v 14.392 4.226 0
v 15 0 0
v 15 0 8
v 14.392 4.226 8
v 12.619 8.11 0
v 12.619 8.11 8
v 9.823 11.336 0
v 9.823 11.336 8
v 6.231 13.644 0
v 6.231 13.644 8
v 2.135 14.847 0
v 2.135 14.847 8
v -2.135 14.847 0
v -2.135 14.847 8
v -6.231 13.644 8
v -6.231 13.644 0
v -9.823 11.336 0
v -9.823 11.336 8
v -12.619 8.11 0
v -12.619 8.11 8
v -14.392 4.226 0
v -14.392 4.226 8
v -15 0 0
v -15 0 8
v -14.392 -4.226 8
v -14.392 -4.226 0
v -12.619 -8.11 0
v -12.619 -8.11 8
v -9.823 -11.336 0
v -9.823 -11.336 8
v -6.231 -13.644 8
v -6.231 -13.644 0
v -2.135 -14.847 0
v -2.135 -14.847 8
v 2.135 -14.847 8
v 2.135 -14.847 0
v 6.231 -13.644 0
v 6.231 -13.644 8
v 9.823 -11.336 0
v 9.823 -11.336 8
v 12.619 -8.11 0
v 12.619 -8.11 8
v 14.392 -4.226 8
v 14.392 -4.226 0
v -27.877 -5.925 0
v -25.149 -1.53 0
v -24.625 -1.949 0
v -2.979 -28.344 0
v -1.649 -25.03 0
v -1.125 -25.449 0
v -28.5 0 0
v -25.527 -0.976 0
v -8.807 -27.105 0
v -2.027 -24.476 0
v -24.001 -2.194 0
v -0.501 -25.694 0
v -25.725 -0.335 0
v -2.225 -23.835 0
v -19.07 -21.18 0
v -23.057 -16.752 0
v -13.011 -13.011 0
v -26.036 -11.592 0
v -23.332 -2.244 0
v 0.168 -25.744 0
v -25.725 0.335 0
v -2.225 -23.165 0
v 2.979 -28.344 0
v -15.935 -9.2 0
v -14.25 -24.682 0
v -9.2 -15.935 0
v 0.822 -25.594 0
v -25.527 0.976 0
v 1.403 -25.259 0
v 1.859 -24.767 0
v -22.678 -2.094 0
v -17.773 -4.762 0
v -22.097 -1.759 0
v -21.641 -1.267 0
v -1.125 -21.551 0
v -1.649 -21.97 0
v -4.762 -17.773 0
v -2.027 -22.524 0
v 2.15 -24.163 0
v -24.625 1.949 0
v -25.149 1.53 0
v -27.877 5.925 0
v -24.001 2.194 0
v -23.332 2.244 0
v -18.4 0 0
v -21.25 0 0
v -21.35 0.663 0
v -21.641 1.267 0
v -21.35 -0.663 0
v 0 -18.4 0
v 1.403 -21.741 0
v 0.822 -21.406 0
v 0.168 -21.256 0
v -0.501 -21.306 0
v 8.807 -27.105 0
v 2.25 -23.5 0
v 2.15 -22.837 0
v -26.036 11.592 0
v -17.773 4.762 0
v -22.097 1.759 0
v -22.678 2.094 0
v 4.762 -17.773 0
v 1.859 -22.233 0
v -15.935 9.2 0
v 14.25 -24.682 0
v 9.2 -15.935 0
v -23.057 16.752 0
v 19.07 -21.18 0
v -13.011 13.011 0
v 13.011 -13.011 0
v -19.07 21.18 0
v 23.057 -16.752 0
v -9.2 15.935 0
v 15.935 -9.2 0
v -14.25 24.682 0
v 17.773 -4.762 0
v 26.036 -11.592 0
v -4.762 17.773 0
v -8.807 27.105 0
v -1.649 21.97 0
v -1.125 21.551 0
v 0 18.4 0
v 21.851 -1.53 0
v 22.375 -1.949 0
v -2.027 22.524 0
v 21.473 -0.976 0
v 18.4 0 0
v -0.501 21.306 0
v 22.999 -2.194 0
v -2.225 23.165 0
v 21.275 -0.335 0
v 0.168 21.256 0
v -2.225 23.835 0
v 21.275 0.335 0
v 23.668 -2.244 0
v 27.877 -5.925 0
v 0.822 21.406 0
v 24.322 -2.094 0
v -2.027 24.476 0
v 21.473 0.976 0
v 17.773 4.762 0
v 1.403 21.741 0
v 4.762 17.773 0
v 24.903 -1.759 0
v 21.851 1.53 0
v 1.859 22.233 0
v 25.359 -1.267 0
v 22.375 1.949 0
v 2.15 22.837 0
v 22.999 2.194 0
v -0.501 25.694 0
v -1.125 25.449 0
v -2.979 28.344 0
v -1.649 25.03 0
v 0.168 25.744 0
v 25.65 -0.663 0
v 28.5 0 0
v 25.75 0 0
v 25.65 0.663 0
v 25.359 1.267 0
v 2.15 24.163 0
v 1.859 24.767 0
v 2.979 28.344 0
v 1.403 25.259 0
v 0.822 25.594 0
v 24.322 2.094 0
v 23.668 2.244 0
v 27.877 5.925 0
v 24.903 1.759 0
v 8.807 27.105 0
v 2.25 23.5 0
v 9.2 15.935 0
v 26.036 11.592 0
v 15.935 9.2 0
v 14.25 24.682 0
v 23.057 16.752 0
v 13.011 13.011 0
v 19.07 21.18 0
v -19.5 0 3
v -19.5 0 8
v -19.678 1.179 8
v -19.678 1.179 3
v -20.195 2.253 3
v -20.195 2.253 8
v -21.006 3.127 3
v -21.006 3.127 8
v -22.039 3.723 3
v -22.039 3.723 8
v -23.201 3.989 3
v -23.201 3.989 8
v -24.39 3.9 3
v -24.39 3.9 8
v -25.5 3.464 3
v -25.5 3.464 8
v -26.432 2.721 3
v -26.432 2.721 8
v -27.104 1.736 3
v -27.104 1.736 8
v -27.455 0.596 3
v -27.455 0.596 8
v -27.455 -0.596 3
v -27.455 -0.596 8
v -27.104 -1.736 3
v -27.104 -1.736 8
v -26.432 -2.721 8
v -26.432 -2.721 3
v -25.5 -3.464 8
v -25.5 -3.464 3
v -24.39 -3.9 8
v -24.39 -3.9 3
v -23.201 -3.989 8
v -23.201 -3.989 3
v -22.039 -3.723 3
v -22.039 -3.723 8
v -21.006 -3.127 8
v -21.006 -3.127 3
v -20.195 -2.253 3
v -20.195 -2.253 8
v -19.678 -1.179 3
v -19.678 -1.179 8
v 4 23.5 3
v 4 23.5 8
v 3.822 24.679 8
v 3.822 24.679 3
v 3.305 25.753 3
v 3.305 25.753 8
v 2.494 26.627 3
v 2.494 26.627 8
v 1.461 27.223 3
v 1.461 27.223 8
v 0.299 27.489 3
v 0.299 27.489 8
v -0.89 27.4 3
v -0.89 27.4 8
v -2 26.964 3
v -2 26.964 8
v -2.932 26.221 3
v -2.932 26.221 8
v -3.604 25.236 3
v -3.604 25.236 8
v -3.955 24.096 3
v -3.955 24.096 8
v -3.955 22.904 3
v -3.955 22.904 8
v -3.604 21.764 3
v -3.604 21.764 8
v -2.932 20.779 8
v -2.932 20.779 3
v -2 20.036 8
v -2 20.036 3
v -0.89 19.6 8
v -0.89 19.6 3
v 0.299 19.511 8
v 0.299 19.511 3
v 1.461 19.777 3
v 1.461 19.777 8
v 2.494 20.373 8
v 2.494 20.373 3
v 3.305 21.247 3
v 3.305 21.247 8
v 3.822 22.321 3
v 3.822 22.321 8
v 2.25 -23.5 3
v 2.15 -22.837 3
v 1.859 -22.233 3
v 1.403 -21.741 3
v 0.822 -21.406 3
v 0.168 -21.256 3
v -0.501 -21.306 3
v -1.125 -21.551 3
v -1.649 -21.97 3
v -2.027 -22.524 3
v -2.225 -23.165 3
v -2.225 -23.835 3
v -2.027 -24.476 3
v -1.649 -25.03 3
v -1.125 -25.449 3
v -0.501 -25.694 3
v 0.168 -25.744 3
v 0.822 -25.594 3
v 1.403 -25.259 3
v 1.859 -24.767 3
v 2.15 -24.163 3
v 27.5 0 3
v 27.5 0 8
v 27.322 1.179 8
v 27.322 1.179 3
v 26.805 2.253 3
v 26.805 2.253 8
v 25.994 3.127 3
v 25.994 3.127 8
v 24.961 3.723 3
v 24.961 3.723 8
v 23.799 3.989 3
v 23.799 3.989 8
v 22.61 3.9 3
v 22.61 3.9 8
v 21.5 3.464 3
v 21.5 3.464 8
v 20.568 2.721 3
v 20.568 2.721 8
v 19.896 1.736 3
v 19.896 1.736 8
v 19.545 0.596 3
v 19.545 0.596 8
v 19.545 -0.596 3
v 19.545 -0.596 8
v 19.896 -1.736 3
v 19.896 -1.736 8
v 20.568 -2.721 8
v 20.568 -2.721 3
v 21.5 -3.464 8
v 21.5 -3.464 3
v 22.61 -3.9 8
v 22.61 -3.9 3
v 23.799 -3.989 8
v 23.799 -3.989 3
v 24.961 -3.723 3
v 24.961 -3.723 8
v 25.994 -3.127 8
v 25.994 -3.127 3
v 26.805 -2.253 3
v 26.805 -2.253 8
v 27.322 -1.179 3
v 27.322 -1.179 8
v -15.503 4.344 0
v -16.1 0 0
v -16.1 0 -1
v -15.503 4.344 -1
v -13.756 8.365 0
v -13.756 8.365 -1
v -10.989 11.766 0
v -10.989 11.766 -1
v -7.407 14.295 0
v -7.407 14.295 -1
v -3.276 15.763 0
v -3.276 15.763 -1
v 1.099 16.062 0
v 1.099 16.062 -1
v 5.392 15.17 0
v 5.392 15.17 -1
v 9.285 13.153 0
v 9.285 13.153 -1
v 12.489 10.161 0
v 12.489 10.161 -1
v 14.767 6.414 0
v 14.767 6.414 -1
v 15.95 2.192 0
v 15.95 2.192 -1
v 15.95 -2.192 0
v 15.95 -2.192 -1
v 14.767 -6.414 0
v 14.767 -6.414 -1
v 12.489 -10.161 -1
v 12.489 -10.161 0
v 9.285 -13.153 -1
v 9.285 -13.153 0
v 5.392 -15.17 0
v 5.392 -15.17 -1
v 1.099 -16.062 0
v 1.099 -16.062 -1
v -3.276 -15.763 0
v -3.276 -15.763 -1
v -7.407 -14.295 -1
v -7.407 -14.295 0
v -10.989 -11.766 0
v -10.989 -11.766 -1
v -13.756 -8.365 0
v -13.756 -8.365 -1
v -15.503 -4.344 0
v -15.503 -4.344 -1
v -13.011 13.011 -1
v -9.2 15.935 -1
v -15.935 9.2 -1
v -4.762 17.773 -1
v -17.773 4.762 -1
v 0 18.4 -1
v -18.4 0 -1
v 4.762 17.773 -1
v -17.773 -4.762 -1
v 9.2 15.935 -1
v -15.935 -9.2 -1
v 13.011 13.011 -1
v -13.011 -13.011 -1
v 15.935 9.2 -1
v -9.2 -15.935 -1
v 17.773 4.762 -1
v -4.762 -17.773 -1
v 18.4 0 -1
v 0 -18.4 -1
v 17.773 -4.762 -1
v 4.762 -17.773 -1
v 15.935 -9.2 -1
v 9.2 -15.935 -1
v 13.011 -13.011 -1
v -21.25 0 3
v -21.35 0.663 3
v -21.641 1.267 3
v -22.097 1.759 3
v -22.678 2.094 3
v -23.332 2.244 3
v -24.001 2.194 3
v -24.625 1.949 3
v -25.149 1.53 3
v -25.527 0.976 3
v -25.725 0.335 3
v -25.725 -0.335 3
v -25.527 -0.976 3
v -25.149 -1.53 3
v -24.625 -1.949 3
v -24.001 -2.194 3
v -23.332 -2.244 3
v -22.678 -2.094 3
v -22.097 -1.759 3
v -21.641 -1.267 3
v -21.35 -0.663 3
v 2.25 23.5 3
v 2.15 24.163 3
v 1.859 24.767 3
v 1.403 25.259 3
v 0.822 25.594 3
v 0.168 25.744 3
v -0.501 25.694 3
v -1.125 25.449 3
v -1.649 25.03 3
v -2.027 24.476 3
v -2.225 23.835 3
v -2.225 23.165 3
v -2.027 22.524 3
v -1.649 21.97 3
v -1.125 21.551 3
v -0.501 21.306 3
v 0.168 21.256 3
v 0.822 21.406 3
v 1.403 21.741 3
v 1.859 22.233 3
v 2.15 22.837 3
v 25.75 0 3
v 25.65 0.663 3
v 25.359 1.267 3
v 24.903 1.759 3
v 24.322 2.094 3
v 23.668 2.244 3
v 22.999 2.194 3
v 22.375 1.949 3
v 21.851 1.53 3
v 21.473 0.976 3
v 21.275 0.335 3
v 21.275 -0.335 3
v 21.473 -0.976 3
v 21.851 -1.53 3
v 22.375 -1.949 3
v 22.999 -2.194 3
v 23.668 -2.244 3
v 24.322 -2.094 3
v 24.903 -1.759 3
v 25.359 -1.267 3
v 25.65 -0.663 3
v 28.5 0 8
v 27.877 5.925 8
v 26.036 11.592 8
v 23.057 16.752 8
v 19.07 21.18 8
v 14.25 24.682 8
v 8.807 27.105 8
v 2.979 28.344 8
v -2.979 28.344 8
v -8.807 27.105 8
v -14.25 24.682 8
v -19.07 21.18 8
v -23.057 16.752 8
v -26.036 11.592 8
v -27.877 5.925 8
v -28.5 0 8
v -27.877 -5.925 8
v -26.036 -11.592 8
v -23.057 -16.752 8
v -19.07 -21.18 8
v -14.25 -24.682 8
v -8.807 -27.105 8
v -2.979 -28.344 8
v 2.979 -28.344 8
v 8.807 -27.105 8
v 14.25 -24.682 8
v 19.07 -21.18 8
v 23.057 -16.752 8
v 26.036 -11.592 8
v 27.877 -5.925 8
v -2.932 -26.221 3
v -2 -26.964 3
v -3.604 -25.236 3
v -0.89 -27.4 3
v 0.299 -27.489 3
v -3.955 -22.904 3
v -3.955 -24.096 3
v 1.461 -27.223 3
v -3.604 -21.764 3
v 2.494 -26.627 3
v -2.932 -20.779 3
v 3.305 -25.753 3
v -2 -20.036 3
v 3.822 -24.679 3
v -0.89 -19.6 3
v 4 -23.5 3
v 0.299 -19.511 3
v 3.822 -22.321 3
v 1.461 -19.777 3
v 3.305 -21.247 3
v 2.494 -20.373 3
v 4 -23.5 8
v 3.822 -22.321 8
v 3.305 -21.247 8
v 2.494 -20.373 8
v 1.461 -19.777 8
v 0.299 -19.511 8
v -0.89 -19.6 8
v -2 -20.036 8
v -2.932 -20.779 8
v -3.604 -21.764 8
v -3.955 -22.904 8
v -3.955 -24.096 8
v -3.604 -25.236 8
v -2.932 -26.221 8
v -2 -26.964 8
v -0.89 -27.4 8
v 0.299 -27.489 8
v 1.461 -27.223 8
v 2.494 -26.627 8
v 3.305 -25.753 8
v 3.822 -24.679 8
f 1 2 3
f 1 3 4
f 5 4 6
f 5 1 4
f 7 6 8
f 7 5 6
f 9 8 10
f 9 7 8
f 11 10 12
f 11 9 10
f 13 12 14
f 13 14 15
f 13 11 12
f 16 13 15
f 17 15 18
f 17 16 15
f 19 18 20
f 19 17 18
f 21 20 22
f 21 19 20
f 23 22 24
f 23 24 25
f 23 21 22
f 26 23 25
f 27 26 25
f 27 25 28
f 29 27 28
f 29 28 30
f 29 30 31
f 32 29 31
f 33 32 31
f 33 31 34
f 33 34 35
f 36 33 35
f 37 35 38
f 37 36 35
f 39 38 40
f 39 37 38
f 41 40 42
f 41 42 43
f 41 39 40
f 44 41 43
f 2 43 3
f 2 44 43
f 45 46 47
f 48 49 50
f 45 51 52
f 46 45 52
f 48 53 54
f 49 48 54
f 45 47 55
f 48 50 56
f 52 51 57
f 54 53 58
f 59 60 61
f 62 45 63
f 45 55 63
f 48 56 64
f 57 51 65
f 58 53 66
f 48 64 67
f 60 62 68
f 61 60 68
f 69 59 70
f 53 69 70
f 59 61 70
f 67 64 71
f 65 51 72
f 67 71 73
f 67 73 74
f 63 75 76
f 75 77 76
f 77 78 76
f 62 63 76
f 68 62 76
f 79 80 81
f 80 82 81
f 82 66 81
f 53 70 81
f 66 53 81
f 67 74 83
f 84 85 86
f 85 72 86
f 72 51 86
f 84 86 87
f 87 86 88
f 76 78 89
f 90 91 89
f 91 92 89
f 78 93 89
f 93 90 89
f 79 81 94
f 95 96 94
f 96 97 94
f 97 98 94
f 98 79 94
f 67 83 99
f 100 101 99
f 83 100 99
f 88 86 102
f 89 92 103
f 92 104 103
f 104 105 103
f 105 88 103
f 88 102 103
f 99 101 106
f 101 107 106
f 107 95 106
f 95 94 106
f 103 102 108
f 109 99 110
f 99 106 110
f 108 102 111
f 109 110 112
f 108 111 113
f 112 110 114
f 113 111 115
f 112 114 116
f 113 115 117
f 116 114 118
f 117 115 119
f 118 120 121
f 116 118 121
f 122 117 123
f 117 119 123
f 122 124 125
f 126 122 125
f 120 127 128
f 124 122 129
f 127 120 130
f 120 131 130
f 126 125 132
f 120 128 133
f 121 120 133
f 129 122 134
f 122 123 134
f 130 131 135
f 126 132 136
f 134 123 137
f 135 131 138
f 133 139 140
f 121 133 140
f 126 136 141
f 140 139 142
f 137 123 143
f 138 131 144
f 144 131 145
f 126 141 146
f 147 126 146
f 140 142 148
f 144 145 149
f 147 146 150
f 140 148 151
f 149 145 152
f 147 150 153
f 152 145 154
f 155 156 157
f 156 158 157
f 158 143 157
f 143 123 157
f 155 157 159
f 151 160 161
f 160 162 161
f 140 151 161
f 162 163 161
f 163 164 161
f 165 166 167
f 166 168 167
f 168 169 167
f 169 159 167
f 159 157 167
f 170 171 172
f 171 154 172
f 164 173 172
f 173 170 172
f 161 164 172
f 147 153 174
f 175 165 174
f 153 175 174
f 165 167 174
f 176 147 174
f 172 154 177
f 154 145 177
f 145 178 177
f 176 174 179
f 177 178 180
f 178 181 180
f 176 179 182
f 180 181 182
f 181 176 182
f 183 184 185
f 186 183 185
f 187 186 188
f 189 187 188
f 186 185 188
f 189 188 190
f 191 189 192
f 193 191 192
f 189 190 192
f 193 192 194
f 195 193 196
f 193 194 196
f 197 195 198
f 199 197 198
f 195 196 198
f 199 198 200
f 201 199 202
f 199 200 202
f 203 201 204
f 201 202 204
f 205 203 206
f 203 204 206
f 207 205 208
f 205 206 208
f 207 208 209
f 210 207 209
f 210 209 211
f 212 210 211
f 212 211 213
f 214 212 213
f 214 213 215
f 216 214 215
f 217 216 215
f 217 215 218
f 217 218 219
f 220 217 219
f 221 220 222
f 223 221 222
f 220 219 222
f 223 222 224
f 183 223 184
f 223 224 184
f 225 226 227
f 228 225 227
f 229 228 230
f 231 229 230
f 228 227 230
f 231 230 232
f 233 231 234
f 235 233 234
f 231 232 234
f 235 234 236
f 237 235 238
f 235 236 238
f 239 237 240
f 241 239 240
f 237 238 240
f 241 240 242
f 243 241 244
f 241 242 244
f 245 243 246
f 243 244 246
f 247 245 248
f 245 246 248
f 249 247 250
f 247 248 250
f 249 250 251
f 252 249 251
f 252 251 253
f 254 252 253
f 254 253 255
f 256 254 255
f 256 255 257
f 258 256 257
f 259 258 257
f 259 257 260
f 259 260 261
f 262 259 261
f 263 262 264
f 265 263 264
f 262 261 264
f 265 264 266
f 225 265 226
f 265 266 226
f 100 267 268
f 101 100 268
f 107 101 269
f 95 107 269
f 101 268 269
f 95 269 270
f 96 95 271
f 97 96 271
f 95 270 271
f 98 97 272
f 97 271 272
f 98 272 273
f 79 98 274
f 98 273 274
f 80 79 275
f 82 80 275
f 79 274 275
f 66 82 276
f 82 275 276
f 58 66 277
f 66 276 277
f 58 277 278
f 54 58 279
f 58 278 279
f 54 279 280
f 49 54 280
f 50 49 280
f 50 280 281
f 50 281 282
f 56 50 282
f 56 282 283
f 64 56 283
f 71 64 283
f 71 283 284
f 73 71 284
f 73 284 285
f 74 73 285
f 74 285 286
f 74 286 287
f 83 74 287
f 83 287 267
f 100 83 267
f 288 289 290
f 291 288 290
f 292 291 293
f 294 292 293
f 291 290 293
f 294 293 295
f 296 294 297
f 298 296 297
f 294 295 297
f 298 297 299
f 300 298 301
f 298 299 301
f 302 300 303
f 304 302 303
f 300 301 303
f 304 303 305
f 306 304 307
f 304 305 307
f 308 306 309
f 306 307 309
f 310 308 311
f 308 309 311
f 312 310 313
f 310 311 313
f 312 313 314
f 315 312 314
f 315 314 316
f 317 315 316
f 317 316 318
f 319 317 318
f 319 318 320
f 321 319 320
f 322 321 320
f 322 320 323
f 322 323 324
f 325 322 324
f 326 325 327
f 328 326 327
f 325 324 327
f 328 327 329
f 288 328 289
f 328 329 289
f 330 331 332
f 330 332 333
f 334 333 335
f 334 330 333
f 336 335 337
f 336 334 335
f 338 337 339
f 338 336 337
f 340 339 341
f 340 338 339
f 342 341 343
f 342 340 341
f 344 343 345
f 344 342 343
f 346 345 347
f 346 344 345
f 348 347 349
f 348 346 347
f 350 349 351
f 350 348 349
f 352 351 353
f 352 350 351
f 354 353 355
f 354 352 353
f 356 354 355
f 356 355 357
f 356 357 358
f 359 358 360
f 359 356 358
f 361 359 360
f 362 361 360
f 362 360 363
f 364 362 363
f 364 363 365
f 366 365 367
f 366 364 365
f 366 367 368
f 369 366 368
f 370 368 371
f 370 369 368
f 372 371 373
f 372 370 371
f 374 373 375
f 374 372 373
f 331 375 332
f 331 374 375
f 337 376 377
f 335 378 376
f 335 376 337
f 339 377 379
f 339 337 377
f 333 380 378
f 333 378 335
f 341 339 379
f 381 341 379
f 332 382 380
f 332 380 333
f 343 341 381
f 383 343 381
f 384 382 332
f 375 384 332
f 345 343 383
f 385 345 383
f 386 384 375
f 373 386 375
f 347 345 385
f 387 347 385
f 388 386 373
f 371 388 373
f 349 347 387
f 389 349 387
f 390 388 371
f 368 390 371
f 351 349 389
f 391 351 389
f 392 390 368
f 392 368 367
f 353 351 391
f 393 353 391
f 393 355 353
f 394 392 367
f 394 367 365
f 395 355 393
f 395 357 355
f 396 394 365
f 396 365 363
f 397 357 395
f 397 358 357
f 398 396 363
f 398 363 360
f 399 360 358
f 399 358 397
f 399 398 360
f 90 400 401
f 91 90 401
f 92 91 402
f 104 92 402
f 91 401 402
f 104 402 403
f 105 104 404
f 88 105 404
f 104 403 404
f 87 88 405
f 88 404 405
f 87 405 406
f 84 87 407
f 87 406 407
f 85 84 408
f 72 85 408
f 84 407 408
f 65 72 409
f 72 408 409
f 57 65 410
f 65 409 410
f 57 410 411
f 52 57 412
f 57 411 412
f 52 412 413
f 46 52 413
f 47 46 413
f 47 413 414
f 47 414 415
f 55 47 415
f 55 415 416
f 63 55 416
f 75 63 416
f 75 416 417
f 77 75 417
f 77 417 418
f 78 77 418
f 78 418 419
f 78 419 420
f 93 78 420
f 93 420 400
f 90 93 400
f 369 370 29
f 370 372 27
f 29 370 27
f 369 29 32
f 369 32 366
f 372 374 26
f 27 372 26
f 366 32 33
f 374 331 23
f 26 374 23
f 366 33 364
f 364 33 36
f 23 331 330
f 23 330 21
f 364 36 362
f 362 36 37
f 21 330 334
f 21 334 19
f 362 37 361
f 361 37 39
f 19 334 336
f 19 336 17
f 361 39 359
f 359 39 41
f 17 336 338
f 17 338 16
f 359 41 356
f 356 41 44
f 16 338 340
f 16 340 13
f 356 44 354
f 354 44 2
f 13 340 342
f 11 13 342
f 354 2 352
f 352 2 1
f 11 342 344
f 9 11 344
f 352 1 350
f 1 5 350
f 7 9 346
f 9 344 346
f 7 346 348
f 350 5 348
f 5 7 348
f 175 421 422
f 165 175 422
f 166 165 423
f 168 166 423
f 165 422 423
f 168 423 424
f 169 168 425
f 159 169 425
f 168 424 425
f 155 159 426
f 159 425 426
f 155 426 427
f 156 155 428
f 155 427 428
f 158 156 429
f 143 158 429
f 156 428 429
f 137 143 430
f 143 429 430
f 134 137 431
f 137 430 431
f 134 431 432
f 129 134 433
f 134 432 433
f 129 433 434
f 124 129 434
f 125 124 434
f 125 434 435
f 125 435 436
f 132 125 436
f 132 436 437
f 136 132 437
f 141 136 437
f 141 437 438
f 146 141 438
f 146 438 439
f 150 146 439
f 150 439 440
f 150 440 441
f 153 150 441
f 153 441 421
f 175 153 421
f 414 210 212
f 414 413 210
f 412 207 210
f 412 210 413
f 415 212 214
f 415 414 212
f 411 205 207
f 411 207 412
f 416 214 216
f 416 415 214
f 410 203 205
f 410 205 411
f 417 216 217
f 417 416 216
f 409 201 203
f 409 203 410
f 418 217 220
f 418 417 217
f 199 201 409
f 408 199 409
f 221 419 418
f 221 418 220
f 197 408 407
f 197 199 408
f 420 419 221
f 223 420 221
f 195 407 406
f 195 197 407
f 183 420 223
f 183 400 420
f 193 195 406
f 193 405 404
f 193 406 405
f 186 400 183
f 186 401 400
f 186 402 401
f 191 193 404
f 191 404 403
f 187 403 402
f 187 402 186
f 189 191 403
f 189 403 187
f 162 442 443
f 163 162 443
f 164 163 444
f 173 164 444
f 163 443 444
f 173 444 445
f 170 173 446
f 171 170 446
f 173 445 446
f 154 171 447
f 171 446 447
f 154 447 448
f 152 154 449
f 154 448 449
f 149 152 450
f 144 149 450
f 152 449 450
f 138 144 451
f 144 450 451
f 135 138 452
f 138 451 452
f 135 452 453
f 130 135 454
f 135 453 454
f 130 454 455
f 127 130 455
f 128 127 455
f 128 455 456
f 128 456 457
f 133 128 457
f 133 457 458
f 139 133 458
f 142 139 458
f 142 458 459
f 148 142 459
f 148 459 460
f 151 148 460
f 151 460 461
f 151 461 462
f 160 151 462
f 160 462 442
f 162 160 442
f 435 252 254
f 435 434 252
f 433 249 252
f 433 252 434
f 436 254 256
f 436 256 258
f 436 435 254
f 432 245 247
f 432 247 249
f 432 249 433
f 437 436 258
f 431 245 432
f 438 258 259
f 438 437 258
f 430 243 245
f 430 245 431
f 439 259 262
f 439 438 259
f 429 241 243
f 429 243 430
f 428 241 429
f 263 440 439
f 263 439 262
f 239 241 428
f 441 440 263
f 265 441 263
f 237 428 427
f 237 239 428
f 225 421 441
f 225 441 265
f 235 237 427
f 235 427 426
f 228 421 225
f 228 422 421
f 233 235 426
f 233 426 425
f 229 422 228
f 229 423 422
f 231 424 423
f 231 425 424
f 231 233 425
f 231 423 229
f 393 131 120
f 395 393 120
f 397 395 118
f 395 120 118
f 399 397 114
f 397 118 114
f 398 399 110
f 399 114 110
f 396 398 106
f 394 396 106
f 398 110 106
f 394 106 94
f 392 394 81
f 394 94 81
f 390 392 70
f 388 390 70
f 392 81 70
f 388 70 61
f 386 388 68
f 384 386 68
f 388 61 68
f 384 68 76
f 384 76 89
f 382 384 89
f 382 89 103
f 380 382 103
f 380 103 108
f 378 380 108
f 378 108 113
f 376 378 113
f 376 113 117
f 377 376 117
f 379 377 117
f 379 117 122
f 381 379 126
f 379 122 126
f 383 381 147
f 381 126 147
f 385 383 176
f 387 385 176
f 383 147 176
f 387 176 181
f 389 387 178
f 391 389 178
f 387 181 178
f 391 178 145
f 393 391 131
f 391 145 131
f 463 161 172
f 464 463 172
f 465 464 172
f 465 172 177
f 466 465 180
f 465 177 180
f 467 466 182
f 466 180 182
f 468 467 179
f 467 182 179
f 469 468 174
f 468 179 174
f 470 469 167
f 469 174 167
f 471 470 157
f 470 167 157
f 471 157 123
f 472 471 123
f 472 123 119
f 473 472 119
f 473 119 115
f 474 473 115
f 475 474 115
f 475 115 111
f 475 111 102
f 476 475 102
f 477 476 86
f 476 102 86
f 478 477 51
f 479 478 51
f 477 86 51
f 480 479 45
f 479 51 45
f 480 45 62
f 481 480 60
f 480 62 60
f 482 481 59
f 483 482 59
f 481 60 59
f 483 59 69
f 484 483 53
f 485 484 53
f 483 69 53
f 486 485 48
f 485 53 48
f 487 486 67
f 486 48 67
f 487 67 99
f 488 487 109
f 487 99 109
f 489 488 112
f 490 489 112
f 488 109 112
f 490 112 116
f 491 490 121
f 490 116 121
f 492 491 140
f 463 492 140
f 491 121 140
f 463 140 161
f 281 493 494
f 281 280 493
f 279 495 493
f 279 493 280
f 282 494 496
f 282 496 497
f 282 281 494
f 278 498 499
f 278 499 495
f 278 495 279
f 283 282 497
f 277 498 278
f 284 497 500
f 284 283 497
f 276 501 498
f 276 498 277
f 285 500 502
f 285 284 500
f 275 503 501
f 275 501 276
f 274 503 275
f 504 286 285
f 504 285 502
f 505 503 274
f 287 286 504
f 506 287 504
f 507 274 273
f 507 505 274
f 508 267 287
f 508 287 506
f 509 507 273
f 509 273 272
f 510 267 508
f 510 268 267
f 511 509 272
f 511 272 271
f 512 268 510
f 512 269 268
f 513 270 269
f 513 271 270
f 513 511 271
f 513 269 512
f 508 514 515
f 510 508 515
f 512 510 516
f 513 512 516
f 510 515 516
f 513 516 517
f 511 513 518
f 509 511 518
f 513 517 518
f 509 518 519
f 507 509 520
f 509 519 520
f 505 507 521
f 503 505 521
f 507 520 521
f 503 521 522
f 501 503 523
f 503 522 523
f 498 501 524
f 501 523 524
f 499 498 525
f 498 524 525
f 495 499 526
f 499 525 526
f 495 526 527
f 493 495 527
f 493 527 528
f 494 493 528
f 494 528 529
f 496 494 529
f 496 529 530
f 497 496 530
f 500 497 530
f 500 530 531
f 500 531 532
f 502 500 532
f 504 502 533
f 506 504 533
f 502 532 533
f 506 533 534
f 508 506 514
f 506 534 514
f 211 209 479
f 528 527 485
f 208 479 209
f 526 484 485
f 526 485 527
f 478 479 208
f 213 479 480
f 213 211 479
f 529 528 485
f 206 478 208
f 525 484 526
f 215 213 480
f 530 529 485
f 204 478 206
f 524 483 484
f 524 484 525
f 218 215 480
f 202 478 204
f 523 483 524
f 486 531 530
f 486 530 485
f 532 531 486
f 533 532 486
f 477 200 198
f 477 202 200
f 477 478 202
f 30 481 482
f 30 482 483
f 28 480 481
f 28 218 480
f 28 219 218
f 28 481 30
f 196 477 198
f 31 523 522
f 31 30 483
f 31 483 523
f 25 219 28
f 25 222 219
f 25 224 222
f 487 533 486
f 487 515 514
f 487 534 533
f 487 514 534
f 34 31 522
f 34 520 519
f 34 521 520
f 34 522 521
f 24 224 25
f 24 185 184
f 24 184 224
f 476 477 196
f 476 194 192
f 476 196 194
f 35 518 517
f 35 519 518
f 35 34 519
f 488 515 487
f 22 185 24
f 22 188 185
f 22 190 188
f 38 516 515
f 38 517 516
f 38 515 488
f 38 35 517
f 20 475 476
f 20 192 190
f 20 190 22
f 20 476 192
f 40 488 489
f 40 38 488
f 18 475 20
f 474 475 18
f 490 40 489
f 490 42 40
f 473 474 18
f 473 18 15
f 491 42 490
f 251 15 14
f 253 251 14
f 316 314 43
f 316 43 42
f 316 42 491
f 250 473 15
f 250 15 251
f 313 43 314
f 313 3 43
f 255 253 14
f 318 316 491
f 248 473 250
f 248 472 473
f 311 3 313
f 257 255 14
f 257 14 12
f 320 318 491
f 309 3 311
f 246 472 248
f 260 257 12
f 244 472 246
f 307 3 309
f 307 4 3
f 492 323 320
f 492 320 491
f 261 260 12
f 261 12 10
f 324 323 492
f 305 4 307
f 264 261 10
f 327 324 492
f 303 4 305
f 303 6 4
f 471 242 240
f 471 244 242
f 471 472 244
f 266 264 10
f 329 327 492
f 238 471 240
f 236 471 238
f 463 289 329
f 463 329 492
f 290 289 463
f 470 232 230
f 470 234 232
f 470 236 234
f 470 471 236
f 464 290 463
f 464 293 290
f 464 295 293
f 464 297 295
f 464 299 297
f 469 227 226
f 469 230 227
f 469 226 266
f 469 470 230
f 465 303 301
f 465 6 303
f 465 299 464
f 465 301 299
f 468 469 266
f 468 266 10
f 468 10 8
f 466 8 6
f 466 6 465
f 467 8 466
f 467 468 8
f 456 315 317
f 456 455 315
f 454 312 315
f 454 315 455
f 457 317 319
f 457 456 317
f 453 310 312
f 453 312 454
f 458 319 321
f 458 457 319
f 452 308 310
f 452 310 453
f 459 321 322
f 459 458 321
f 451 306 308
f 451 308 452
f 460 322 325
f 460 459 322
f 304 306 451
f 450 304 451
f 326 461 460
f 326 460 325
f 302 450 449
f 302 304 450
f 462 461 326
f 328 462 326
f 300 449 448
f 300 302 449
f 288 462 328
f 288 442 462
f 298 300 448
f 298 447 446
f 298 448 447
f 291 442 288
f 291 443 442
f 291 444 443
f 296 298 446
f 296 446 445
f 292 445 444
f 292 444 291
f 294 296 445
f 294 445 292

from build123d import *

# Parameters (mm, degrees)
SKETCH_1_R          = 28.5
SKETCH_1_R_2        = 15
EXTRUDE_1_DEPTH     = 8
SKETCH_2_R          = 18.4
SKETCH_2_R_2        = 16.1
EXTRUDE_2_DEPTH     = 1
SKETCH_3_R          = 4
CUT_EXTRUDE_1_DEPTH = 5
SKETCH_4_R          = 2.25
CUT_EXTRUDE_2_DEPTH = 42.297699694


with BuildPart() as part:
    # 草图1 → 拉伸1 (new body)
    with BuildSketch(Plane.XY):
        Circle(SKETCH_1_R)
        Circle(SKETCH_1_R_2, mode=Mode.SUBTRACT)
    extrude(amount=EXTRUDE_1_DEPTH)

    # 草图2 → 拉伸2 (add)
    with BuildSketch(Plane(origin=(0, 0, 0), x_dir=(-1, 0, 0), z_dir=(0, 0, -1))):
        with Locations(Location((0, 0, 0), (0, 0, 180))):
            Circle(SKETCH_2_R)
        Circle(SKETCH_2_R_2, mode=Mode.SUBTRACT)
    extrude(amount=EXTRUDE_2_DEPTH)

    # 草图3 → 切除-拉伸1 (cut)
    with BuildSketch(Plane.XY.offset(8)):
        with Locations((0, 23.5)):
            Circle(SKETCH_3_R)
        with Locations((-23.5, 0)):
            Circle(SKETCH_3_R)
        with Locations((0, -23.5)):
            Circle(SKETCH_3_R)
        with Locations((23.5, 0)):
            Circle(SKETCH_3_R)
    extrude(amount=-CUT_EXTRUDE_1_DEPTH, mode=Mode.SUBTRACT)

    # 草图4 → 切除-拉伸2 (cut, through all)
    with BuildSketch(Plane.XY.offset(8)):
        with Locations((-23.5, 0)):
            Circle(SKETCH_4_R)
        with Locations((0, 23.5)):
            Circle(SKETCH_4_R)
        with Locations((23.5, 0)):
            Circle(SKETCH_4_R)
        with Locations((0, -23.5)):
            Circle(SKETCH_4_R)
    extrude(amount=-CUT_EXTRUDE_2_DEPTH, mode=Mode.SUBTRACT)


solid = part.part
